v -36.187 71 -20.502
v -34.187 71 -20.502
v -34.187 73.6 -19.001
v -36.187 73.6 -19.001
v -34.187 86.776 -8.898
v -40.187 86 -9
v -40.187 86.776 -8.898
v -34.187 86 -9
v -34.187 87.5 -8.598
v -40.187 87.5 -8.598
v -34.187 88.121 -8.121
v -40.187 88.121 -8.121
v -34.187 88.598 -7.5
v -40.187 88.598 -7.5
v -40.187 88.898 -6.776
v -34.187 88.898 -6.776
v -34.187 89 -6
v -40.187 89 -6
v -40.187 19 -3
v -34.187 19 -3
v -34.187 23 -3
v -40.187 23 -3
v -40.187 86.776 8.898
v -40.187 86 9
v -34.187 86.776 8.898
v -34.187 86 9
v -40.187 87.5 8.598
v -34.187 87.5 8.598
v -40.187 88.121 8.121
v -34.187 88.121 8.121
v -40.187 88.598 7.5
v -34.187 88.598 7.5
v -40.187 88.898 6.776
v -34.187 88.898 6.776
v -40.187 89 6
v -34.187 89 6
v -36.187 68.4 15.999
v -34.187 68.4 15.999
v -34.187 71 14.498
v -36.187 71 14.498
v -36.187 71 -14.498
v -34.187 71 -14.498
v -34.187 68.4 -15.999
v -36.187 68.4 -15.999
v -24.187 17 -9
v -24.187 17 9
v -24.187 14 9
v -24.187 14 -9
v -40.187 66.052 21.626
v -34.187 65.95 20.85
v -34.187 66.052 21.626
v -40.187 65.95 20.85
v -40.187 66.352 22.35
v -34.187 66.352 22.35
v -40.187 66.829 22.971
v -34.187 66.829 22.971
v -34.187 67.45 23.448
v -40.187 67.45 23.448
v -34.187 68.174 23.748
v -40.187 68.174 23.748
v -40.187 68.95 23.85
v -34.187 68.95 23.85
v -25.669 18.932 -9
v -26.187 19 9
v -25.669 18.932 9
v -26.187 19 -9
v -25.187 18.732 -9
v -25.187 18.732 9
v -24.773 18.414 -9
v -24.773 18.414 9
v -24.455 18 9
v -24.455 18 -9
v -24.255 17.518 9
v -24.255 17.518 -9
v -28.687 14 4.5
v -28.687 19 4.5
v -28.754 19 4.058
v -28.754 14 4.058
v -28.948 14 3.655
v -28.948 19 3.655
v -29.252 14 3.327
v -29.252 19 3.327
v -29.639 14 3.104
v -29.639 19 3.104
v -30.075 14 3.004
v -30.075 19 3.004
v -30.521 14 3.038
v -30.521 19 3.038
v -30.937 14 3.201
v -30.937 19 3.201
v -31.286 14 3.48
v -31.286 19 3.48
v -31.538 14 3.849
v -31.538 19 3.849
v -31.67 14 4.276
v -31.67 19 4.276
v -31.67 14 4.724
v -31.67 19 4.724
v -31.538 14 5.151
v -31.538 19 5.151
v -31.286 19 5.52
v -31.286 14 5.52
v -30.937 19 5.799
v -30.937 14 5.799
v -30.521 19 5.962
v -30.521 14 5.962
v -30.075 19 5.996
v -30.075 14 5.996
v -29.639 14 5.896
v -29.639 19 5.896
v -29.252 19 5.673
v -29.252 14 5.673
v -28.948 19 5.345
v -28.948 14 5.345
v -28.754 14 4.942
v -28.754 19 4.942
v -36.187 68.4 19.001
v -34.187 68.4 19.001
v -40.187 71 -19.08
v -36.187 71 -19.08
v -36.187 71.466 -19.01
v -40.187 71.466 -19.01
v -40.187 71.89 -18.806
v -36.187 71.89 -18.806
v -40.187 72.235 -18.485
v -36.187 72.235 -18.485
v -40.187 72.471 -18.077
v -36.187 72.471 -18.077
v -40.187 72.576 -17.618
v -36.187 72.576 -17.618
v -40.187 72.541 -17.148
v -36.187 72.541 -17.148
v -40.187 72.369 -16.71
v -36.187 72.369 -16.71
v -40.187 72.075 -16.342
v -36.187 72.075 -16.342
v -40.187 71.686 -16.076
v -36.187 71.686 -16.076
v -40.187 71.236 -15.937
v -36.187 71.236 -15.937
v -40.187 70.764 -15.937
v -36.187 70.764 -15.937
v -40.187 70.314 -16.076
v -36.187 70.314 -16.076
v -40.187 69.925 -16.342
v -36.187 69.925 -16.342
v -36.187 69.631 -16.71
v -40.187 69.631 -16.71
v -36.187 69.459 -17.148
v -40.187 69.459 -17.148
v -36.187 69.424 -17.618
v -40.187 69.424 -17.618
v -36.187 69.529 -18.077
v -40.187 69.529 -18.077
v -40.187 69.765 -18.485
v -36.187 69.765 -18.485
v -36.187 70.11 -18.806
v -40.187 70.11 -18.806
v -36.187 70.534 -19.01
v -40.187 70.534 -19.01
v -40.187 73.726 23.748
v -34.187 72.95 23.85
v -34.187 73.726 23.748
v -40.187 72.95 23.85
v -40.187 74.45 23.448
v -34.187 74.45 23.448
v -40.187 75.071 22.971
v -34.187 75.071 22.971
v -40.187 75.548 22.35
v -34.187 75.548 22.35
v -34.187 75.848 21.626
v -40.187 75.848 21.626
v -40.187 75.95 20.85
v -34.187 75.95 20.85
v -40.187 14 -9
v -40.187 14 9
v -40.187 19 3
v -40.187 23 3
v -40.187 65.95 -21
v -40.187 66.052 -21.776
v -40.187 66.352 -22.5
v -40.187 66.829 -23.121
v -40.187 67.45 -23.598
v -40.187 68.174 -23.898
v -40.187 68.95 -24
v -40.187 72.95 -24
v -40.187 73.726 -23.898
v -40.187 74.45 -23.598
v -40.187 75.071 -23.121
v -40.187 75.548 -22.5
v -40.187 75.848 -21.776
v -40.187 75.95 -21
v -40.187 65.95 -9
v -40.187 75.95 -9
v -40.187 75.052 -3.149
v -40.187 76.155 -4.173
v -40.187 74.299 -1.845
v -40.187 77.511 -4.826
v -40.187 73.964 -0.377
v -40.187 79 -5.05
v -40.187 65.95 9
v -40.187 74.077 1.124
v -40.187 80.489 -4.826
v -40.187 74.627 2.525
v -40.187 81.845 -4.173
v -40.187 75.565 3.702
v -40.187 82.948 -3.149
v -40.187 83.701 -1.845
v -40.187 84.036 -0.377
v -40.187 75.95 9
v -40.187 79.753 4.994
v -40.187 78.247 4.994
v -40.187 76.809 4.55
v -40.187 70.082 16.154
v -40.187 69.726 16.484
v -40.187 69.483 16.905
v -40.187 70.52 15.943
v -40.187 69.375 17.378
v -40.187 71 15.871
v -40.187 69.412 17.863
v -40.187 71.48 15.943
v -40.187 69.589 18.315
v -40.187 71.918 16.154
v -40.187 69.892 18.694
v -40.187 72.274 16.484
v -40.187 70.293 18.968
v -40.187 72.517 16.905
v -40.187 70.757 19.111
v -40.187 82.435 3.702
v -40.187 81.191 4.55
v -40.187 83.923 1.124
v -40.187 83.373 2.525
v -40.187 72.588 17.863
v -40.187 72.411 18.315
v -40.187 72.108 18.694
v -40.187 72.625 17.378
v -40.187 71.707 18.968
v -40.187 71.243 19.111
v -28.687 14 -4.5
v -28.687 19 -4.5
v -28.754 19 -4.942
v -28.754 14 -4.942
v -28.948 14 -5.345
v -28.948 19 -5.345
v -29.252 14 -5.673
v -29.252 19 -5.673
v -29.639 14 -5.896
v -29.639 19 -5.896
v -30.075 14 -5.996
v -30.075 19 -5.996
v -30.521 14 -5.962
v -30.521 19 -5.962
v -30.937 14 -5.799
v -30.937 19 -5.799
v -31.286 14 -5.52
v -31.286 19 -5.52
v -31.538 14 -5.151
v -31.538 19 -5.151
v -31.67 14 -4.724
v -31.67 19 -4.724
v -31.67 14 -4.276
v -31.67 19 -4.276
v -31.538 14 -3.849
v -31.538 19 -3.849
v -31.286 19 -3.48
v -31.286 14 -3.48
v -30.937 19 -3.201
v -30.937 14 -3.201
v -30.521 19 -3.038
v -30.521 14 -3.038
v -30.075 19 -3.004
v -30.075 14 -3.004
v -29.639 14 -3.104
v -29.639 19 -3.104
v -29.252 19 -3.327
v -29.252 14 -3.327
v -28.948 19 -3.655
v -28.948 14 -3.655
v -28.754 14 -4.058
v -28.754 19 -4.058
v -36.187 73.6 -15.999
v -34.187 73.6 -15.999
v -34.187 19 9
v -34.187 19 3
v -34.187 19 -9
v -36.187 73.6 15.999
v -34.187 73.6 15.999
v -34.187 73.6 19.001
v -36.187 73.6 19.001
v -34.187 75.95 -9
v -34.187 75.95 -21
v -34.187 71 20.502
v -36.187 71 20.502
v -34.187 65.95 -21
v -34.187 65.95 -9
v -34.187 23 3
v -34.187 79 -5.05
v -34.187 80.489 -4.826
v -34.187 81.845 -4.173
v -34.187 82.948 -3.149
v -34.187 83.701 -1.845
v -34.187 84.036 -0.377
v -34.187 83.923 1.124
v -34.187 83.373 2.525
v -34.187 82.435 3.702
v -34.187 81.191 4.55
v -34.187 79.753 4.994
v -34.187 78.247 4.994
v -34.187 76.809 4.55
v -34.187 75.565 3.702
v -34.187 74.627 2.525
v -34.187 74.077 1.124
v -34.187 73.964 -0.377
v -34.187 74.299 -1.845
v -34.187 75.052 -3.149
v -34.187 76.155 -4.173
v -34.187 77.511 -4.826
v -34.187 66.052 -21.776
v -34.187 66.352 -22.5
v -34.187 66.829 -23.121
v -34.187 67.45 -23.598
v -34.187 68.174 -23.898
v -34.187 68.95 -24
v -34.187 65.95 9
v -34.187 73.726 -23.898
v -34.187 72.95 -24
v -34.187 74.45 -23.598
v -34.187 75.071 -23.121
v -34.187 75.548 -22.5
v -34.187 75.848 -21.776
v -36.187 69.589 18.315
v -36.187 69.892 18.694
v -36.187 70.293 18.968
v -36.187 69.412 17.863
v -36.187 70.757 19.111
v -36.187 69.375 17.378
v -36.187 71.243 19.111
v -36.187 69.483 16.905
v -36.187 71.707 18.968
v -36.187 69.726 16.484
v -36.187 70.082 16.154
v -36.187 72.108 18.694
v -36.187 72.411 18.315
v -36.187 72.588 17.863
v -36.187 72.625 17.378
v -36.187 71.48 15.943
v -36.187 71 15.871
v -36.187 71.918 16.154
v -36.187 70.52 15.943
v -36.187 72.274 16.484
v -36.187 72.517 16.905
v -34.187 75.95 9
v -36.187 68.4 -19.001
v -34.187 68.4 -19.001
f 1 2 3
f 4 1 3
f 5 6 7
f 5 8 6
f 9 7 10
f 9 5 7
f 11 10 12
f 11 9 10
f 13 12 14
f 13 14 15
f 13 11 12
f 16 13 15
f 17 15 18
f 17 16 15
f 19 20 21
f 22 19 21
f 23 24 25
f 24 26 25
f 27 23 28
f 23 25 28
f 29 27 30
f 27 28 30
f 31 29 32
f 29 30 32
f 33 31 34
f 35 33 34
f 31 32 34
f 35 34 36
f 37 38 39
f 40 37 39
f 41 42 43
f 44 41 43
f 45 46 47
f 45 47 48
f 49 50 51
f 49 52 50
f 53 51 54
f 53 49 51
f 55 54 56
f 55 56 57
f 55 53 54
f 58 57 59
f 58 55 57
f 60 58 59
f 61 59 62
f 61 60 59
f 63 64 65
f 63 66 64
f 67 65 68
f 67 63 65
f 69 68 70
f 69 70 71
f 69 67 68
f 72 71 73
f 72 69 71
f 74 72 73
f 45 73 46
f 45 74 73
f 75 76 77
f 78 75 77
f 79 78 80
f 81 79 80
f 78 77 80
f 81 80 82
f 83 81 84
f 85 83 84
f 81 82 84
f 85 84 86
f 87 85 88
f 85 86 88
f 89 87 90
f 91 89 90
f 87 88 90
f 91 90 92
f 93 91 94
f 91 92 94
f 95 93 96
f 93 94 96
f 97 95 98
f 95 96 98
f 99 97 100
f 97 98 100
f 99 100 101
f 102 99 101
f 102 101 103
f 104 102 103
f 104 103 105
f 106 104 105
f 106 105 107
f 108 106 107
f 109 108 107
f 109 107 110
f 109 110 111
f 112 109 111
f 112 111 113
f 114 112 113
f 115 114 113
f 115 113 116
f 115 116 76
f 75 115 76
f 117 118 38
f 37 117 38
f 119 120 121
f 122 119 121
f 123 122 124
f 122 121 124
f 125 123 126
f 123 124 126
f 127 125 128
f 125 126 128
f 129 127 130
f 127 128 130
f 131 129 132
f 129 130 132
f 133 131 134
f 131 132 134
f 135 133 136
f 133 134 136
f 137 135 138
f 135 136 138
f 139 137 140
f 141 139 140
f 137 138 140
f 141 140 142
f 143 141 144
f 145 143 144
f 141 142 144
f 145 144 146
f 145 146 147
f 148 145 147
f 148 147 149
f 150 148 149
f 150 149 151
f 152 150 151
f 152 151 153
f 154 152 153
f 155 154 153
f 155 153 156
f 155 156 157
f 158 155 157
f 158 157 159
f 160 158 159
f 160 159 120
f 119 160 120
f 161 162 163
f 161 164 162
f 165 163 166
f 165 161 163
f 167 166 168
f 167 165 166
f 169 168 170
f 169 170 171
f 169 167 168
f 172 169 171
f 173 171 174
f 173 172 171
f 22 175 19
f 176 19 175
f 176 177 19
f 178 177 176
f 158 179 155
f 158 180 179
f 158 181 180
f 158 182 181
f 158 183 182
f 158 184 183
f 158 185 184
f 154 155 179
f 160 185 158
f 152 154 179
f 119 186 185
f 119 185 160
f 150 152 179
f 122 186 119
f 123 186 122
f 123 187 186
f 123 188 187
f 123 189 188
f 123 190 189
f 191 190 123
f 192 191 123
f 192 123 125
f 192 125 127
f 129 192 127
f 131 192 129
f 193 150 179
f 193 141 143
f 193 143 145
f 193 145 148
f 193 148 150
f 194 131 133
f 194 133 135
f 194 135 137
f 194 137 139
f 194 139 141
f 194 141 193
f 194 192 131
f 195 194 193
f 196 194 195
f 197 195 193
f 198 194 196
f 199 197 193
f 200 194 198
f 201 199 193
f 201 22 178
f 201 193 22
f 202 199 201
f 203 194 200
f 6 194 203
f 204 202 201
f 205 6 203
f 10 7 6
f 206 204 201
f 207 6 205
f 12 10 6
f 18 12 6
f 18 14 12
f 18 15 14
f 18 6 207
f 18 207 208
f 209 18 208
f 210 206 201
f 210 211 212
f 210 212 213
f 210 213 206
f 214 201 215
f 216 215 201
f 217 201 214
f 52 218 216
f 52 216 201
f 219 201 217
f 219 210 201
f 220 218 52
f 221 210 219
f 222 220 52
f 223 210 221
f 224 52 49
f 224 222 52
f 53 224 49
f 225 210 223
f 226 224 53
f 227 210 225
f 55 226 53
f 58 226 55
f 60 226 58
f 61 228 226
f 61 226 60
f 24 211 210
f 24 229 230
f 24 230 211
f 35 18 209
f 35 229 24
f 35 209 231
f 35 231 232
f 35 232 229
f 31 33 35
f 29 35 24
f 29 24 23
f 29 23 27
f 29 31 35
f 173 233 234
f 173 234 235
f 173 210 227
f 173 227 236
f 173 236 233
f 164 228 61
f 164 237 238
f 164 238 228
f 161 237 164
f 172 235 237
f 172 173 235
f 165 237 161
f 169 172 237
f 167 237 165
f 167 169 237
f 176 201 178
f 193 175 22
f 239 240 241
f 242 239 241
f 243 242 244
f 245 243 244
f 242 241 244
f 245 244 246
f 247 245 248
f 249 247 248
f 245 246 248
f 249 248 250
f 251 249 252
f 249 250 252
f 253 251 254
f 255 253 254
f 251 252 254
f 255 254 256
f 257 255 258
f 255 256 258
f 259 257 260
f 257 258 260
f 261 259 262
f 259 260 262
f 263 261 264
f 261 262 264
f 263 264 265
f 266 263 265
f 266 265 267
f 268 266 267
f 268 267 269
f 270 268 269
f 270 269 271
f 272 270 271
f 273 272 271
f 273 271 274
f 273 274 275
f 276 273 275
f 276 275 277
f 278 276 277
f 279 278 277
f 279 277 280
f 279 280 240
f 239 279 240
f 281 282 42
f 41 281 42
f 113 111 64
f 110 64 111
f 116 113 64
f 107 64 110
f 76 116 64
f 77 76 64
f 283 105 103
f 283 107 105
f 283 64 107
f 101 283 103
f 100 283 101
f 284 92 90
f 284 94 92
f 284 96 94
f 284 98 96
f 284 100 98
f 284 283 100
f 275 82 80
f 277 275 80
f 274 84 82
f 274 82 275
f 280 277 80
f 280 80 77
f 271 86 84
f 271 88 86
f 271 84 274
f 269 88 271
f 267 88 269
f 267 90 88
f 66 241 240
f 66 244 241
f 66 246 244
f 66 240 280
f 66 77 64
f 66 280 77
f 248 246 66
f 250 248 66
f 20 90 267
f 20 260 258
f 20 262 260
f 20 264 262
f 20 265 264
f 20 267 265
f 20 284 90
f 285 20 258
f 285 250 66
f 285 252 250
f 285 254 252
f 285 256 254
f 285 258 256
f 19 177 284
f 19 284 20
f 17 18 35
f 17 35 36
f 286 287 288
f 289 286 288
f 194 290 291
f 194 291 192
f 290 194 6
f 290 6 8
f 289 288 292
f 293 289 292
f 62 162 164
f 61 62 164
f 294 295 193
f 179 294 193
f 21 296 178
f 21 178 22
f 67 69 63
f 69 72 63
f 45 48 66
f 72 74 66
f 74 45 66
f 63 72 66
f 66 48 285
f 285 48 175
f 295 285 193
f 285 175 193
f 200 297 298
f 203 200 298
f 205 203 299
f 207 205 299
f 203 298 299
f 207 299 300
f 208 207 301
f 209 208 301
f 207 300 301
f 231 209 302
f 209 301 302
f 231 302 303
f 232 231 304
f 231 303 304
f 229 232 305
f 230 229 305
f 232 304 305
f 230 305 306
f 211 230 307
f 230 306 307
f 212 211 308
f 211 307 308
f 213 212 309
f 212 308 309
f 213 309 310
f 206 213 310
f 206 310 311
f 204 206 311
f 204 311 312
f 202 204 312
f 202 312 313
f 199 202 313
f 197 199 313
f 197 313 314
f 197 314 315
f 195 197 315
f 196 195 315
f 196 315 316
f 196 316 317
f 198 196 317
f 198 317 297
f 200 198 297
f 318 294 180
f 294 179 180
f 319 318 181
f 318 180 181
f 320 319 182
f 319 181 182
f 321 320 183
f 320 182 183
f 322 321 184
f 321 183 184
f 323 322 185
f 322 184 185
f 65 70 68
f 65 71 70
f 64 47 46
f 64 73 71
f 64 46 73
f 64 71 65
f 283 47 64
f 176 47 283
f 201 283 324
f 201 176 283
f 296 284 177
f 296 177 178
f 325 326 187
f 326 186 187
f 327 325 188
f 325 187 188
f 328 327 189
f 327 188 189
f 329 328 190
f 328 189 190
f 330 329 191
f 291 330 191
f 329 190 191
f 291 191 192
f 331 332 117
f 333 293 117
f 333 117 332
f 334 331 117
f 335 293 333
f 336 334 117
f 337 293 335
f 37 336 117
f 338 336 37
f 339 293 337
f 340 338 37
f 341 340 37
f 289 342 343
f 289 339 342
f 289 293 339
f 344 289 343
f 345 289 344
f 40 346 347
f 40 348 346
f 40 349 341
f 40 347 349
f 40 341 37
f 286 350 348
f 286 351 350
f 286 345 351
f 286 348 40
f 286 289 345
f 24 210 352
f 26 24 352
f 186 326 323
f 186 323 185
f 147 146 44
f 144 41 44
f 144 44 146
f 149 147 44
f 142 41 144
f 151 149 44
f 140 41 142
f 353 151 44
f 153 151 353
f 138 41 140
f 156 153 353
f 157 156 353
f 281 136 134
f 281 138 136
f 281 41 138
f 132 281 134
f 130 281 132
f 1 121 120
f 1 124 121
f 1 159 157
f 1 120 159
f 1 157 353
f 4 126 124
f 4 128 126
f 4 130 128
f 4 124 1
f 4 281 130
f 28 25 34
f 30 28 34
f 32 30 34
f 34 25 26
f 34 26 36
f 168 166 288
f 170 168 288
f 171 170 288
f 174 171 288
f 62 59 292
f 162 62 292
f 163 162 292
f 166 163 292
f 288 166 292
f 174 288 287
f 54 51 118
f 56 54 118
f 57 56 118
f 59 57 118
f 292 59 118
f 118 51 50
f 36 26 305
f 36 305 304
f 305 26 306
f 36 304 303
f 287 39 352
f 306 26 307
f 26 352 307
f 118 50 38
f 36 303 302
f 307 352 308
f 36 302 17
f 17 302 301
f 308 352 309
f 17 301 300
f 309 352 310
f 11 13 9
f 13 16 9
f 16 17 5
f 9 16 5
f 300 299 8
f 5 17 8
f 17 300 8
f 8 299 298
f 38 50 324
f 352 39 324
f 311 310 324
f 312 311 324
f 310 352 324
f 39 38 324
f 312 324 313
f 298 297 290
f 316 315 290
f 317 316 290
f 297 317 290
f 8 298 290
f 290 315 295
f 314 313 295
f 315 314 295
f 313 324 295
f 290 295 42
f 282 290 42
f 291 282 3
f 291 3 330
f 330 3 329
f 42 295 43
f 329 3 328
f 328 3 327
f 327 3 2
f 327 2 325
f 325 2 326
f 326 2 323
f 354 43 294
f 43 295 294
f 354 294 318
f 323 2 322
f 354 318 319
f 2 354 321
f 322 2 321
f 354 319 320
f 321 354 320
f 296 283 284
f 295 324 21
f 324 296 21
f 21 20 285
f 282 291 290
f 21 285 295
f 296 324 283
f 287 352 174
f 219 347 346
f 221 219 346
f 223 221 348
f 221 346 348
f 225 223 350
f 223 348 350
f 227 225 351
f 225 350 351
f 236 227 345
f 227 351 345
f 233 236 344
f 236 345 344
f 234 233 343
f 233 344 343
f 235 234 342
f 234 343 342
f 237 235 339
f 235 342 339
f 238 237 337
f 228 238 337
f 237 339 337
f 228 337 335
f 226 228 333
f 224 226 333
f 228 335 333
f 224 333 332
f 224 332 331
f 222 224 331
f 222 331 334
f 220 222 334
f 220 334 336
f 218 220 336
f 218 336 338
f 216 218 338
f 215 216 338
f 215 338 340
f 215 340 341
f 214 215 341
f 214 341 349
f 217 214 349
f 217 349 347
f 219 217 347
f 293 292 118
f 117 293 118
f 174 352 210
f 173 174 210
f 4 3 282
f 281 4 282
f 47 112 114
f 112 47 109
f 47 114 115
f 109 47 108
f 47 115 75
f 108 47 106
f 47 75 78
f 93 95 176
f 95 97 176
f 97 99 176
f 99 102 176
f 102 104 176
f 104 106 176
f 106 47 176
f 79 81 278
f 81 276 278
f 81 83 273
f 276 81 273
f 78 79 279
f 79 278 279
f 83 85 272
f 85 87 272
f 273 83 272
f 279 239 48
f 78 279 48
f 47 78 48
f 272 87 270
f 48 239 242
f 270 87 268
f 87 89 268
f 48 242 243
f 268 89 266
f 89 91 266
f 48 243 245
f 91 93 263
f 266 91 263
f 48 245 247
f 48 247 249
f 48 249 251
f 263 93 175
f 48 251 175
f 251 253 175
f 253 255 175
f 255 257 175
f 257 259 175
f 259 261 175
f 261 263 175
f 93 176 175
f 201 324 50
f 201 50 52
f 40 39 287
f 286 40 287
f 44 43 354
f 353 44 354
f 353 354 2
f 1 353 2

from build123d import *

# Parameters (mm, degrees)
SKETCH1_R                 = 17.45
SKETCH1_R_2               = 12.45
BOSS_EXTRUDE1_DEPTH       = 8
SKETCH2_R                 = 20
SKETCH2_R_2               = 12.45
BOSS_EXTRUDE2_DEPTH       = 2
SKETCH3_R                 = 32.5
SKETCH3_R_2               = 12.45
BOSS_EXTRUDE3_DEPTH       = 4
FILLET1_R                 = 1
BOSS_EXTRUDE6_START       = -4
SKETCH10_W                = 10
SKETCH10_H                = 18
BOSS_EXTRUDE6_DEPTH       = 4
SKETCH4_W                 = 6
SKETCH4_H                 = 18
BOSS_EXTRUDE4_DEPTH       = 75
BOSS_EXTRUDE4_DEPTH_BACK  = 4
SKETCH5_R                 = 5.05
CUT_EXTRUDE1_DEPTH        = 306
CUT_EXTRUDE1_DEPTH_BACK   = 113
SKETCH6_W                 = 6
SKETCH6_H                 = 10
BOSS_EXTRUDE5_DEPTH       = 15
BOSS_EXTRUDE5_DEPTH_BACK  = 32.85
SKETCH7_R                 = 1.629220746
SKETCH7_R_2               = 1.580258945
CUT_EXTRUDE2_DEPTH        = 10
SKETCH9_R                 = 5.05
CUT_EXTRUDE3_DEPTH        = 10
CUT_EXTRUDE3_DEPTH_BACK   = 10
SKETCH11_W                = 9.782596874
SKETCH11_H                = 3.234517514
CUT_EXTRUDE4_DEPTH        = 123
CUT_EXTRUDE4_DEPTH_BACK   = 61
FILLET4_R                 = 3
FILLET5_R                 = 3
SKETCH12_W                = 108.791398151
SKETCH12_H                = 24.041848298
CUT_EXTRUDE5_DEPTH        = 110.678
SKETCH15_R                = 22
CUT_EXTRUDE7_DEPTH        = 4
SKETCH13_R                = 22
SKETCH13_R_2              = 11
SKETCH13_R_3              = 2.75
BOSS_EXTRUDE7_DEPTH       = 4
FILLET6_R                 = 3
CUT_EXTRUDE8_DEPTH        = 5
FILLET7_R                 = 1
BOSS_EXTRUDE8_START       = -3
BOSS_EXTRUDE8_DEPTH       = 9.4
FILLET8_R                 = 3
FILLET8_OF_MIRROR2_R      = 3
CUT_EXTRUDE12_START       = -6
SKETCH21_R                = 6.05
CUT_EXTRUDE12_DEPTH       = 3.8
SKETCH18_W                = 88.746975794
SKETCH18_H                = 20.386854219
CUT_EXTRUDE9_DEPTH        = 10
SKETCH19_W                = 6
SKETCH19_H                = 10.45
BOSS_EXTRUDE9_DEPTH       = 5
FILLET9_R                 = 2
CUT_EXTRUDE13_DEPTH       = 2
SKETCH23_R                = 1
CUT_EXTRUDE14_DEPTH       = 11
CUT_EXTRUDE16_DEPTH       = 1.7
CUT_EXTRUDE17_DEPTH       = 30
CUT_EXTRUDE17_DEPTH_BACK  = 70
SKETCH27_W                = 18
SKETCH27_H                = 5
BOSS_EXTRUDE10_DEPTH      = 10
BOSS_EXTRUDE10_DEPTH_BACK = 6
FILLET10_R                = 2
SKETCH28_W                = 6
SKETCH28_H                = 4
CUT_EXTRUDE18_DEPTH       = 10
SKETCH29_R                = 1.5
CUT_EXTRUDE19_DEPTH       = 100


with BuildPart() as part:
    # Sketch1 → Boss-Extrude1 (new body)
    with BuildSketch(Plane(origin=(0, 0, 0), x_dir=(1, 0, 0), z_dir=(0, 1, 0))):
        Circle(SKETCH1_R)
        Circle(SKETCH1_R_2, mode=Mode.SUBTRACT)
    extrude(amount=BOSS_EXTRUDE1_DEPTH)

    # Sketch2 → Boss-Extrude2 (add)
    with BuildSketch(Plane(origin=(0, 8, 0), x_dir=(1, 0, 0), z_dir=(0, 1, 0))):
        Circle(SKETCH2_R)
        Circle(SKETCH2_R_2, mode=Mode.SUBTRACT)
    extrude(amount=BOSS_EXTRUDE2_DEPTH)

    # Sketch3 → Boss-Extrude3 (add)
    with BuildSketch(Plane(origin=(0, 10, 0), x_dir=(1, 0, 0), z_dir=(0, 1, 0))):
        Circle(SKETCH3_R)
        Circle(SKETCH3_R_2, mode=Mode.SUBTRACT)
    extrude(amount=BOSS_EXTRUDE3_DEPTH)

    # Fillet1
    fillet1_edges = [part.edges().sort_by_distance(p)[0] for p in [
        (-32.5, 14, 0),
    ]]
    fillet(fillet1_edges, radius=FILLET1_R)

    # Sketch10 → Boss-Extrude6 (add)
    with BuildSketch(Plane(origin=(0, 14, 0), x_dir=(1, 0, 0), z_dir=(0, 1, 0)).offset(BOSS_EXTRUDE6_START)):
        with Locations((35.186917696, 0)):
            Rectangle(SKETCH10_W, SKETCH10_H)
        with Locations((-35.186917696, 0)):
            Rectangle(SKETCH10_W, SKETCH10_H)
    extrude(amount=BOSS_EXTRUDE6_DEPTH)

    # Sketch4 → Boss-Extrude4 (add, two sides)
    with BuildSketch(Plane(origin=(0, 14, 0), x_dir=(1, 0, 0), z_dir=(0, 1, 0))) as boss_extrude4_sk:
        with Locations((-37.186917696, 0)):
            Rectangle(SKETCH4_W, SKETCH4_H)
        with Locations((37.186917696, 0)):
            Rectangle(SKETCH4_W, SKETCH4_H)
    extrude(amount=BOSS_EXTRUDE4_DEPTH)
    extrude(boss_extrude4_sk.sketch, amount=-BOSS_EXTRUDE4_DEPTH_BACK)

    # Sketch5 → Cut-Extrude1 (cut, two sides)
    with BuildSketch(Plane.ZY.offset(-34.186917696)) as cut_extrude1_sk:
        with Locations((0, 79)):
            Circle(SKETCH5_R)
    extrude(amount=CUT_EXTRUDE1_DEPTH, mode=Mode.SUBTRACT)
    extrude(cut_extrude1_sk.sketch, amount=-CUT_EXTRUDE1_DEPTH_BACK, mode=Mode.SUBTRACT)

    # Sketch6 → Boss-Extrude5 (add, two sides)
    with BuildSketch(Plane(origin=(0, 0, -9), x_dir=(-1, 0, 0), z_dir=(0, 0, -1))) as boss_extrude5_sk:
        with Locations((37.186917696, 70.95)):
            Rectangle(SKETCH6_W, SKETCH6_H)
    extrude(amount=BOSS_EXTRUDE5_DEPTH)
    extrude(boss_extrude5_sk.sketch, amount=-BOSS_EXTRUDE5_DEPTH_BACK)

    # Sketch7 → Cut-Extrude2 (cut)
    with BuildSketch(Plane(origin=(-34.186917696, 0, 0), x_dir=(0, 0, -1), z_dir=(1, 0, 0))):
        with Locations((-17.5, 71)):
            Circle(SKETCH7_R)
        with Locations((17.5, 71)):
            Circle(SKETCH7_R_2)
    extrude(amount=-CUT_EXTRUDE2_DEPTH, mode=Mode.SUBTRACT)

    # Sketch9 → Cut-Extrude3 (cut, two sides)
    with BuildSketch(Plane(origin=(-34.186917696, 0, 0), x_dir=(0, 0, -1), z_dir=(1, 0, 0))) as cut_extrude3_sk:
        with Locations((0, 79)):
            Circle(SKETCH9_R)
    extrude(amount=CUT_EXTRUDE3_DEPTH, mode=Mode.SUBTRACT)
    extrude(cut_extrude3_sk.sketch, amount=-CUT_EXTRUDE3_DEPTH_BACK, mode=Mode.SUBTRACT)

    # Sketch11 → Cut-Extrude4 (cut, two sides)
    with BuildSketch(Plane.ZY.offset(-34.186917696)) as cut_extrude4_sk:
        with Locations((0, 15.617258757)):
            Rectangle(SKETCH11_W, SKETCH11_H)
    extrude(amount=CUT_EXTRUDE4_DEPTH, mode=Mode.SUBTRACT)
    extrude(cut_extrude4_sk.sketch, amount=-CUT_EXTRUDE4_DEPTH_BACK, mode=Mode.SUBTRACT)

    # Fillet4
    fillet4_edges = [part.edges().sort_by_distance(p)[0] for p in [
        (-37.186917696, 65.95, 23.85),
        (-37.186917696, 75.95, 23.85),
        (-37.186917696, 65.95, -24),
        (-37.186917696, 75.95, -24),
        (-37.186917696, 89, -9),
        (-37.186917696, 89, 9),
    ]]
    fillet(fillet4_edges, radius=FILLET4_R)

    # Fillet5
    fillet5_edges = [part.edges().sort_by_distance(p)[0] for p in [
        (40.186917696, 10, 0),
        (-40.186917696, 10, 0),
    ]]
    fillet(fillet5_edges, radius=FILLET5_R)

    # Sketch12 → Cut-Extrude5 (cut)
    with BuildSketch(Plane(origin=(40.186917696, 0, 0), x_dir=(0, 0, -1), z_dir=(1, 0, 0))):
        with Locations((-12.502918017, -2.020924149)):
            Rectangle(SKETCH12_W, SKETCH12_H)
    extrude(amount=-CUT_EXTRUDE5_DEPTH, mode=Mode.SUBTRACT)

    # Sketch15 → Cut-Extrude7 (cut)
    with BuildSketch(Plane(origin=(0, 14, 0), x_dir=(1, 0, 0), z_dir=(0, 1, 0))):
        Circle(SKETCH15_R)
    extrude(amount=-CUT_EXTRUDE7_DEPTH, mode=Mode.SUBTRACT)

    # Sketch13 → Boss-Extrude7 (add)
    with BuildSketch(Plane(origin=(0, 14, 0), x_dir=(1, 0, 0), z_dir=(0, 1, 0))):
        Circle(SKETCH13_R)
        Circle(SKETCH13_R_2, mode=Mode.SUBTRACT)
        with Locations((0, 17.5)):
            Circle(SKETCH13_R_3, mode=Mode.SUBTRACT)
        with Locations((-15.155444566, -8.75)):
            Circle(SKETCH13_R_3, mode=Mode.SUBTRACT)
        with Locations((15.155444566, -8.75)):
            Circle(SKETCH13_R_3, mode=Mode.SUBTRACT)
    extrude(amount=-BOSS_EXTRUDE7_DEPTH)

    # Fillet6
    fillet6_edges = [part.edges().sort_by_distance(p)[0] for p in [
        (37.186917696, 89, 9),
        (37.186917696, 89, -9),
    ]]
    fillet(fillet6_edges, radius=FILLET6_R)

    # Sketch16 → Cut-Extrude8 (cut)
    with BuildSketch(Plane.XZ.offset(-10)):
        with BuildLine():
            Line((-31.228992939, 9), (-20.29384143, 9))
            ThreePointArc((-20.29384143, 9), (0, 22.2), (20.29384143, 9))
            Line((20.29384143, 9), (31.228992939, 9))
            ThreePointArc((31.228992939, 9), (0, 32.5), (-31.228992939, 9))
        make_face()
    cut_extrude8 = extrude(amount=-CUT_EXTRUDE8_DEPTH, mode=Mode.SUBTRACT)

    # Mirror1: Cut-Extrude8 across plane
    add(cut_extrude8.mirror(Plane.XY), mode=Mode.SUBTRACT)

    # Fillet7
    fillet7_edges = [part.edges().sort_by_distance(p)[0] for p in [
        (0, 14, 22.2),
        (0, 14, -22.2),
    ]]
    fillet(fillet7_edges, radius=FILLET7_R)

    # Sketch17 → Boss-Extrude8 (add)
    with BuildSketch(Plane.XZ.offset(-10).offset(BOSS_EXTRUDE8_START)):
        with BuildLine():
            Line((20.29384143, -9), (40.186917696, -9))
            Line((40.186917696, -9), (40.186917696, 9))
            Line((40.186917696, 9), (20.29384143, 9))
            ThreePointArc((20.29384143, 9), (22.2, 0), (20.29384143, -9))
        make_face()
    boss_extrude8 = extrude(amount=BOSS_EXTRUDE8_DEPTH)

    # Fillet8
    fillet8_edges = [part.edges().sort_by_distance(p)[0] for p in [
        (40.186917696, 3.6, 0),
    ]]
    fillet(fillet8_edges, radius=FILLET8_R)

    # Mirror2: Boss-Extrude8 across plane
    add(boss_extrude8.mirror(Plane(origin=(0, 0, 0), x_dir=(0, 0, 1), z_dir=(1, 0, 0))))

    # Fillet8 of Mirror2
    fillet8_of_mirror2_edges = [part.edges().sort_by_distance(p)[0] for p in [
        (-40.186917696, 3.6, 0),
    ]]
    fillet(fillet8_of_mirror2_edges, radius=FILLET8_OF_MIRROR2_R)

    # Sketch21 → Cut-Extrude12 (cut)
    with BuildSketch(Plane(origin=(40.186917696, 0, 0), x_dir=(0, 0, -1), z_dir=(1, 0, 0)).offset(CUT_EXTRUDE12_START)):
        with Locations((0, 79)):
            Circle(SKETCH21_R)
    extrude(amount=CUT_EXTRUDE12_DEPTH, mode=Mode.SUBTRACT)

    # Sketch18 → Cut-Extrude9 (cut)
    with BuildSketch(Plane(origin=(40.186917696, 0, 0), x_dir=(0, 0, -1), z_dir=(1, 0, 0))):
        with Locations((0, 89.193427109)):
            Rectangle(SKETCH18_W, SKETCH18_H)
    extrude(amount=-CUT_EXTRUDE9_DEPTH, mode=Mode.SUBTRACT)

    # Sketch19 → Boss-Extrude9 (add)
    with BuildSketch(Plane(origin=(0, 79, 0), x_dir=(1, 0, 0), z_dir=(0, 1, 0))):
        with Locations((37.186917696, -11.275)):
            Rectangle(SKETCH19_W, SKETCH19_H)
        with Locations((37.186917696, 11.275)):
            Rectangle(SKETCH19_W, SKETCH19_H)
    extrude(amount=-BOSS_EXTRUDE9_DEPTH)

    # Fillet9
    fillet9_edges = [part.edges().sort_by_distance(p)[0] for p in [
        (37.186917696, 74, 16.5),
        (37.186917696, 74, -16.5),
    ]]
    fillet(fillet9_edges, radius=FILLET9_R)

    # Sketch22 → Cut-Extrude13 (cut)
    with BuildSketch(Plane(origin=(-34.186917696, 0, 0), x_dir=(0, 0, -1), z_dir=(1, 0, 0))):
        Polygon((-15.9988893, 68.4), (-14.4977786, 71), (-15.9988893, 73.6), (-19.0011107, 73.6), (-20.5022214, 71), (-19.0011107, 68.4), align=None)
        Polygon((20.5022214, 71), (19.0011107, 73.6), (15.9988893, 73.6), (14.4977786, 71), (15.9988893, 68.4), (19.0011107, 68.4), align=None)
    extrude(amount=-CUT_EXTRUDE13_DEPTH, mode=Mode.SUBTRACT)

    # Sketch23 → Cut-Extrude14 (cut)
    with BuildSketch(Plane(origin=(0, 79, 0), x_dir=(1, 0, 0), z_dir=(0, 1, 0))):
        with Locations((37.186917696, -12.3)):
            Circle(SKETCH23_R)
        with Locations((37.186917696, 12.3)):
            Circle(SKETCH23_R)
    extrude(amount=-CUT_EXTRUDE14_DEPTH, mode=Mode.SUBTRACT)

    # Sketch24 → Cut-Extrude16 (cut)
    with BuildSketch(Plane.XZ.offset(-74)):
        Polygon((37.186917696, 9.990598923), (39.186917696, 11.145299462), (39.186917696, 13.454700538), (37.186917696, 14.609401077), (35.186917696, 13.454700538), (35.186917696, 11.145299462), align=None)
        Polygon((37.186917696, -14.609401077), (39.186917696, -13.454700538), (39.186917696, -11.145299462), (37.186917696, -9.990598923), (35.186917696, -11.145299462), (35.186917696, -13.454700538), align=None)
    extrude(amount=-CUT_EXTRUDE16_DEPTH, mode=Mode.SUBTRACT)

    # Sketch26 → Cut-Extrude17 (cut, two sides)
    with BuildSketch(Plane(origin=(0, 0, -9), x_dir=(-1, 0, 0), z_dir=(0, 0, -1))) as cut_extrude17_sk:
        Polygon((34.186917696, 14), (34.186917696, 94.491380316), (-54.251567272, 94.491380316), (-54.251567272, -8.918618382), (55.508733715, -8.918618382), (55.508733715, 14), align=None)
    extrude(amount=CUT_EXTRUDE17_DEPTH, mode=Mode.SUBTRACT)
    extrude(cut_extrude17_sk.sketch, amount=-CUT_EXTRUDE17_DEPTH_BACK, mode=Mode.SUBTRACT)

    # Sketch27 → Boss-Extrude10 (add, two sides)
    with BuildSketch(Plane(origin=(-34.186917696, 0, 0), x_dir=(0, 0, -1), z_dir=(1, 0, 0))) as boss_extrude10_sk:
        with Locations((0, 16.5)):
            Rectangle(SKETCH27_W, SKETCH27_H)
    extrude(amount=BOSS_EXTRUDE10_DEPTH)
    extrude(boss_extrude10_sk.sketch, amount=-BOSS_EXTRUDE10_DEPTH_BACK)

    # Fillet10
    fillet10_edges = [part.edges().sort_by_distance(p)[0] for p in [
        (-24.186917696, 19, 0),
    ]]
    fillet(fillet10_edges, radius=FILLET10_R)

    # Sketch28 → Cut-Extrude18 (cut)
    with BuildSketch(Plane(origin=(-34.186917696, 0, 0), x_dir=(0, 0, -1), z_dir=(1, 0, 0))):
        with Locations((0, 21)):
            Rectangle(SKETCH28_W, SKETCH28_H)
    extrude(amount=-CUT_EXTRUDE18_DEPTH, mode=Mode.SUBTRACT)

    # Sketch29 → Cut-Extrude19 (cut)
    with BuildSketch(Plane(origin=(0, 19, 0), x_dir=(1, 0, 0), z_dir=(0, 1, 0))):
        with Locations((-30.186917696, -4.5)):
            Circle(SKETCH29_R)
        with Locations((-30.186917696, 4.5)):
            Circle(SKETCH29_R)
    extrude(amount=-CUT_EXTRUDE19_DEPTH, mode=Mode.SUBTRACT)


solid = part.part
